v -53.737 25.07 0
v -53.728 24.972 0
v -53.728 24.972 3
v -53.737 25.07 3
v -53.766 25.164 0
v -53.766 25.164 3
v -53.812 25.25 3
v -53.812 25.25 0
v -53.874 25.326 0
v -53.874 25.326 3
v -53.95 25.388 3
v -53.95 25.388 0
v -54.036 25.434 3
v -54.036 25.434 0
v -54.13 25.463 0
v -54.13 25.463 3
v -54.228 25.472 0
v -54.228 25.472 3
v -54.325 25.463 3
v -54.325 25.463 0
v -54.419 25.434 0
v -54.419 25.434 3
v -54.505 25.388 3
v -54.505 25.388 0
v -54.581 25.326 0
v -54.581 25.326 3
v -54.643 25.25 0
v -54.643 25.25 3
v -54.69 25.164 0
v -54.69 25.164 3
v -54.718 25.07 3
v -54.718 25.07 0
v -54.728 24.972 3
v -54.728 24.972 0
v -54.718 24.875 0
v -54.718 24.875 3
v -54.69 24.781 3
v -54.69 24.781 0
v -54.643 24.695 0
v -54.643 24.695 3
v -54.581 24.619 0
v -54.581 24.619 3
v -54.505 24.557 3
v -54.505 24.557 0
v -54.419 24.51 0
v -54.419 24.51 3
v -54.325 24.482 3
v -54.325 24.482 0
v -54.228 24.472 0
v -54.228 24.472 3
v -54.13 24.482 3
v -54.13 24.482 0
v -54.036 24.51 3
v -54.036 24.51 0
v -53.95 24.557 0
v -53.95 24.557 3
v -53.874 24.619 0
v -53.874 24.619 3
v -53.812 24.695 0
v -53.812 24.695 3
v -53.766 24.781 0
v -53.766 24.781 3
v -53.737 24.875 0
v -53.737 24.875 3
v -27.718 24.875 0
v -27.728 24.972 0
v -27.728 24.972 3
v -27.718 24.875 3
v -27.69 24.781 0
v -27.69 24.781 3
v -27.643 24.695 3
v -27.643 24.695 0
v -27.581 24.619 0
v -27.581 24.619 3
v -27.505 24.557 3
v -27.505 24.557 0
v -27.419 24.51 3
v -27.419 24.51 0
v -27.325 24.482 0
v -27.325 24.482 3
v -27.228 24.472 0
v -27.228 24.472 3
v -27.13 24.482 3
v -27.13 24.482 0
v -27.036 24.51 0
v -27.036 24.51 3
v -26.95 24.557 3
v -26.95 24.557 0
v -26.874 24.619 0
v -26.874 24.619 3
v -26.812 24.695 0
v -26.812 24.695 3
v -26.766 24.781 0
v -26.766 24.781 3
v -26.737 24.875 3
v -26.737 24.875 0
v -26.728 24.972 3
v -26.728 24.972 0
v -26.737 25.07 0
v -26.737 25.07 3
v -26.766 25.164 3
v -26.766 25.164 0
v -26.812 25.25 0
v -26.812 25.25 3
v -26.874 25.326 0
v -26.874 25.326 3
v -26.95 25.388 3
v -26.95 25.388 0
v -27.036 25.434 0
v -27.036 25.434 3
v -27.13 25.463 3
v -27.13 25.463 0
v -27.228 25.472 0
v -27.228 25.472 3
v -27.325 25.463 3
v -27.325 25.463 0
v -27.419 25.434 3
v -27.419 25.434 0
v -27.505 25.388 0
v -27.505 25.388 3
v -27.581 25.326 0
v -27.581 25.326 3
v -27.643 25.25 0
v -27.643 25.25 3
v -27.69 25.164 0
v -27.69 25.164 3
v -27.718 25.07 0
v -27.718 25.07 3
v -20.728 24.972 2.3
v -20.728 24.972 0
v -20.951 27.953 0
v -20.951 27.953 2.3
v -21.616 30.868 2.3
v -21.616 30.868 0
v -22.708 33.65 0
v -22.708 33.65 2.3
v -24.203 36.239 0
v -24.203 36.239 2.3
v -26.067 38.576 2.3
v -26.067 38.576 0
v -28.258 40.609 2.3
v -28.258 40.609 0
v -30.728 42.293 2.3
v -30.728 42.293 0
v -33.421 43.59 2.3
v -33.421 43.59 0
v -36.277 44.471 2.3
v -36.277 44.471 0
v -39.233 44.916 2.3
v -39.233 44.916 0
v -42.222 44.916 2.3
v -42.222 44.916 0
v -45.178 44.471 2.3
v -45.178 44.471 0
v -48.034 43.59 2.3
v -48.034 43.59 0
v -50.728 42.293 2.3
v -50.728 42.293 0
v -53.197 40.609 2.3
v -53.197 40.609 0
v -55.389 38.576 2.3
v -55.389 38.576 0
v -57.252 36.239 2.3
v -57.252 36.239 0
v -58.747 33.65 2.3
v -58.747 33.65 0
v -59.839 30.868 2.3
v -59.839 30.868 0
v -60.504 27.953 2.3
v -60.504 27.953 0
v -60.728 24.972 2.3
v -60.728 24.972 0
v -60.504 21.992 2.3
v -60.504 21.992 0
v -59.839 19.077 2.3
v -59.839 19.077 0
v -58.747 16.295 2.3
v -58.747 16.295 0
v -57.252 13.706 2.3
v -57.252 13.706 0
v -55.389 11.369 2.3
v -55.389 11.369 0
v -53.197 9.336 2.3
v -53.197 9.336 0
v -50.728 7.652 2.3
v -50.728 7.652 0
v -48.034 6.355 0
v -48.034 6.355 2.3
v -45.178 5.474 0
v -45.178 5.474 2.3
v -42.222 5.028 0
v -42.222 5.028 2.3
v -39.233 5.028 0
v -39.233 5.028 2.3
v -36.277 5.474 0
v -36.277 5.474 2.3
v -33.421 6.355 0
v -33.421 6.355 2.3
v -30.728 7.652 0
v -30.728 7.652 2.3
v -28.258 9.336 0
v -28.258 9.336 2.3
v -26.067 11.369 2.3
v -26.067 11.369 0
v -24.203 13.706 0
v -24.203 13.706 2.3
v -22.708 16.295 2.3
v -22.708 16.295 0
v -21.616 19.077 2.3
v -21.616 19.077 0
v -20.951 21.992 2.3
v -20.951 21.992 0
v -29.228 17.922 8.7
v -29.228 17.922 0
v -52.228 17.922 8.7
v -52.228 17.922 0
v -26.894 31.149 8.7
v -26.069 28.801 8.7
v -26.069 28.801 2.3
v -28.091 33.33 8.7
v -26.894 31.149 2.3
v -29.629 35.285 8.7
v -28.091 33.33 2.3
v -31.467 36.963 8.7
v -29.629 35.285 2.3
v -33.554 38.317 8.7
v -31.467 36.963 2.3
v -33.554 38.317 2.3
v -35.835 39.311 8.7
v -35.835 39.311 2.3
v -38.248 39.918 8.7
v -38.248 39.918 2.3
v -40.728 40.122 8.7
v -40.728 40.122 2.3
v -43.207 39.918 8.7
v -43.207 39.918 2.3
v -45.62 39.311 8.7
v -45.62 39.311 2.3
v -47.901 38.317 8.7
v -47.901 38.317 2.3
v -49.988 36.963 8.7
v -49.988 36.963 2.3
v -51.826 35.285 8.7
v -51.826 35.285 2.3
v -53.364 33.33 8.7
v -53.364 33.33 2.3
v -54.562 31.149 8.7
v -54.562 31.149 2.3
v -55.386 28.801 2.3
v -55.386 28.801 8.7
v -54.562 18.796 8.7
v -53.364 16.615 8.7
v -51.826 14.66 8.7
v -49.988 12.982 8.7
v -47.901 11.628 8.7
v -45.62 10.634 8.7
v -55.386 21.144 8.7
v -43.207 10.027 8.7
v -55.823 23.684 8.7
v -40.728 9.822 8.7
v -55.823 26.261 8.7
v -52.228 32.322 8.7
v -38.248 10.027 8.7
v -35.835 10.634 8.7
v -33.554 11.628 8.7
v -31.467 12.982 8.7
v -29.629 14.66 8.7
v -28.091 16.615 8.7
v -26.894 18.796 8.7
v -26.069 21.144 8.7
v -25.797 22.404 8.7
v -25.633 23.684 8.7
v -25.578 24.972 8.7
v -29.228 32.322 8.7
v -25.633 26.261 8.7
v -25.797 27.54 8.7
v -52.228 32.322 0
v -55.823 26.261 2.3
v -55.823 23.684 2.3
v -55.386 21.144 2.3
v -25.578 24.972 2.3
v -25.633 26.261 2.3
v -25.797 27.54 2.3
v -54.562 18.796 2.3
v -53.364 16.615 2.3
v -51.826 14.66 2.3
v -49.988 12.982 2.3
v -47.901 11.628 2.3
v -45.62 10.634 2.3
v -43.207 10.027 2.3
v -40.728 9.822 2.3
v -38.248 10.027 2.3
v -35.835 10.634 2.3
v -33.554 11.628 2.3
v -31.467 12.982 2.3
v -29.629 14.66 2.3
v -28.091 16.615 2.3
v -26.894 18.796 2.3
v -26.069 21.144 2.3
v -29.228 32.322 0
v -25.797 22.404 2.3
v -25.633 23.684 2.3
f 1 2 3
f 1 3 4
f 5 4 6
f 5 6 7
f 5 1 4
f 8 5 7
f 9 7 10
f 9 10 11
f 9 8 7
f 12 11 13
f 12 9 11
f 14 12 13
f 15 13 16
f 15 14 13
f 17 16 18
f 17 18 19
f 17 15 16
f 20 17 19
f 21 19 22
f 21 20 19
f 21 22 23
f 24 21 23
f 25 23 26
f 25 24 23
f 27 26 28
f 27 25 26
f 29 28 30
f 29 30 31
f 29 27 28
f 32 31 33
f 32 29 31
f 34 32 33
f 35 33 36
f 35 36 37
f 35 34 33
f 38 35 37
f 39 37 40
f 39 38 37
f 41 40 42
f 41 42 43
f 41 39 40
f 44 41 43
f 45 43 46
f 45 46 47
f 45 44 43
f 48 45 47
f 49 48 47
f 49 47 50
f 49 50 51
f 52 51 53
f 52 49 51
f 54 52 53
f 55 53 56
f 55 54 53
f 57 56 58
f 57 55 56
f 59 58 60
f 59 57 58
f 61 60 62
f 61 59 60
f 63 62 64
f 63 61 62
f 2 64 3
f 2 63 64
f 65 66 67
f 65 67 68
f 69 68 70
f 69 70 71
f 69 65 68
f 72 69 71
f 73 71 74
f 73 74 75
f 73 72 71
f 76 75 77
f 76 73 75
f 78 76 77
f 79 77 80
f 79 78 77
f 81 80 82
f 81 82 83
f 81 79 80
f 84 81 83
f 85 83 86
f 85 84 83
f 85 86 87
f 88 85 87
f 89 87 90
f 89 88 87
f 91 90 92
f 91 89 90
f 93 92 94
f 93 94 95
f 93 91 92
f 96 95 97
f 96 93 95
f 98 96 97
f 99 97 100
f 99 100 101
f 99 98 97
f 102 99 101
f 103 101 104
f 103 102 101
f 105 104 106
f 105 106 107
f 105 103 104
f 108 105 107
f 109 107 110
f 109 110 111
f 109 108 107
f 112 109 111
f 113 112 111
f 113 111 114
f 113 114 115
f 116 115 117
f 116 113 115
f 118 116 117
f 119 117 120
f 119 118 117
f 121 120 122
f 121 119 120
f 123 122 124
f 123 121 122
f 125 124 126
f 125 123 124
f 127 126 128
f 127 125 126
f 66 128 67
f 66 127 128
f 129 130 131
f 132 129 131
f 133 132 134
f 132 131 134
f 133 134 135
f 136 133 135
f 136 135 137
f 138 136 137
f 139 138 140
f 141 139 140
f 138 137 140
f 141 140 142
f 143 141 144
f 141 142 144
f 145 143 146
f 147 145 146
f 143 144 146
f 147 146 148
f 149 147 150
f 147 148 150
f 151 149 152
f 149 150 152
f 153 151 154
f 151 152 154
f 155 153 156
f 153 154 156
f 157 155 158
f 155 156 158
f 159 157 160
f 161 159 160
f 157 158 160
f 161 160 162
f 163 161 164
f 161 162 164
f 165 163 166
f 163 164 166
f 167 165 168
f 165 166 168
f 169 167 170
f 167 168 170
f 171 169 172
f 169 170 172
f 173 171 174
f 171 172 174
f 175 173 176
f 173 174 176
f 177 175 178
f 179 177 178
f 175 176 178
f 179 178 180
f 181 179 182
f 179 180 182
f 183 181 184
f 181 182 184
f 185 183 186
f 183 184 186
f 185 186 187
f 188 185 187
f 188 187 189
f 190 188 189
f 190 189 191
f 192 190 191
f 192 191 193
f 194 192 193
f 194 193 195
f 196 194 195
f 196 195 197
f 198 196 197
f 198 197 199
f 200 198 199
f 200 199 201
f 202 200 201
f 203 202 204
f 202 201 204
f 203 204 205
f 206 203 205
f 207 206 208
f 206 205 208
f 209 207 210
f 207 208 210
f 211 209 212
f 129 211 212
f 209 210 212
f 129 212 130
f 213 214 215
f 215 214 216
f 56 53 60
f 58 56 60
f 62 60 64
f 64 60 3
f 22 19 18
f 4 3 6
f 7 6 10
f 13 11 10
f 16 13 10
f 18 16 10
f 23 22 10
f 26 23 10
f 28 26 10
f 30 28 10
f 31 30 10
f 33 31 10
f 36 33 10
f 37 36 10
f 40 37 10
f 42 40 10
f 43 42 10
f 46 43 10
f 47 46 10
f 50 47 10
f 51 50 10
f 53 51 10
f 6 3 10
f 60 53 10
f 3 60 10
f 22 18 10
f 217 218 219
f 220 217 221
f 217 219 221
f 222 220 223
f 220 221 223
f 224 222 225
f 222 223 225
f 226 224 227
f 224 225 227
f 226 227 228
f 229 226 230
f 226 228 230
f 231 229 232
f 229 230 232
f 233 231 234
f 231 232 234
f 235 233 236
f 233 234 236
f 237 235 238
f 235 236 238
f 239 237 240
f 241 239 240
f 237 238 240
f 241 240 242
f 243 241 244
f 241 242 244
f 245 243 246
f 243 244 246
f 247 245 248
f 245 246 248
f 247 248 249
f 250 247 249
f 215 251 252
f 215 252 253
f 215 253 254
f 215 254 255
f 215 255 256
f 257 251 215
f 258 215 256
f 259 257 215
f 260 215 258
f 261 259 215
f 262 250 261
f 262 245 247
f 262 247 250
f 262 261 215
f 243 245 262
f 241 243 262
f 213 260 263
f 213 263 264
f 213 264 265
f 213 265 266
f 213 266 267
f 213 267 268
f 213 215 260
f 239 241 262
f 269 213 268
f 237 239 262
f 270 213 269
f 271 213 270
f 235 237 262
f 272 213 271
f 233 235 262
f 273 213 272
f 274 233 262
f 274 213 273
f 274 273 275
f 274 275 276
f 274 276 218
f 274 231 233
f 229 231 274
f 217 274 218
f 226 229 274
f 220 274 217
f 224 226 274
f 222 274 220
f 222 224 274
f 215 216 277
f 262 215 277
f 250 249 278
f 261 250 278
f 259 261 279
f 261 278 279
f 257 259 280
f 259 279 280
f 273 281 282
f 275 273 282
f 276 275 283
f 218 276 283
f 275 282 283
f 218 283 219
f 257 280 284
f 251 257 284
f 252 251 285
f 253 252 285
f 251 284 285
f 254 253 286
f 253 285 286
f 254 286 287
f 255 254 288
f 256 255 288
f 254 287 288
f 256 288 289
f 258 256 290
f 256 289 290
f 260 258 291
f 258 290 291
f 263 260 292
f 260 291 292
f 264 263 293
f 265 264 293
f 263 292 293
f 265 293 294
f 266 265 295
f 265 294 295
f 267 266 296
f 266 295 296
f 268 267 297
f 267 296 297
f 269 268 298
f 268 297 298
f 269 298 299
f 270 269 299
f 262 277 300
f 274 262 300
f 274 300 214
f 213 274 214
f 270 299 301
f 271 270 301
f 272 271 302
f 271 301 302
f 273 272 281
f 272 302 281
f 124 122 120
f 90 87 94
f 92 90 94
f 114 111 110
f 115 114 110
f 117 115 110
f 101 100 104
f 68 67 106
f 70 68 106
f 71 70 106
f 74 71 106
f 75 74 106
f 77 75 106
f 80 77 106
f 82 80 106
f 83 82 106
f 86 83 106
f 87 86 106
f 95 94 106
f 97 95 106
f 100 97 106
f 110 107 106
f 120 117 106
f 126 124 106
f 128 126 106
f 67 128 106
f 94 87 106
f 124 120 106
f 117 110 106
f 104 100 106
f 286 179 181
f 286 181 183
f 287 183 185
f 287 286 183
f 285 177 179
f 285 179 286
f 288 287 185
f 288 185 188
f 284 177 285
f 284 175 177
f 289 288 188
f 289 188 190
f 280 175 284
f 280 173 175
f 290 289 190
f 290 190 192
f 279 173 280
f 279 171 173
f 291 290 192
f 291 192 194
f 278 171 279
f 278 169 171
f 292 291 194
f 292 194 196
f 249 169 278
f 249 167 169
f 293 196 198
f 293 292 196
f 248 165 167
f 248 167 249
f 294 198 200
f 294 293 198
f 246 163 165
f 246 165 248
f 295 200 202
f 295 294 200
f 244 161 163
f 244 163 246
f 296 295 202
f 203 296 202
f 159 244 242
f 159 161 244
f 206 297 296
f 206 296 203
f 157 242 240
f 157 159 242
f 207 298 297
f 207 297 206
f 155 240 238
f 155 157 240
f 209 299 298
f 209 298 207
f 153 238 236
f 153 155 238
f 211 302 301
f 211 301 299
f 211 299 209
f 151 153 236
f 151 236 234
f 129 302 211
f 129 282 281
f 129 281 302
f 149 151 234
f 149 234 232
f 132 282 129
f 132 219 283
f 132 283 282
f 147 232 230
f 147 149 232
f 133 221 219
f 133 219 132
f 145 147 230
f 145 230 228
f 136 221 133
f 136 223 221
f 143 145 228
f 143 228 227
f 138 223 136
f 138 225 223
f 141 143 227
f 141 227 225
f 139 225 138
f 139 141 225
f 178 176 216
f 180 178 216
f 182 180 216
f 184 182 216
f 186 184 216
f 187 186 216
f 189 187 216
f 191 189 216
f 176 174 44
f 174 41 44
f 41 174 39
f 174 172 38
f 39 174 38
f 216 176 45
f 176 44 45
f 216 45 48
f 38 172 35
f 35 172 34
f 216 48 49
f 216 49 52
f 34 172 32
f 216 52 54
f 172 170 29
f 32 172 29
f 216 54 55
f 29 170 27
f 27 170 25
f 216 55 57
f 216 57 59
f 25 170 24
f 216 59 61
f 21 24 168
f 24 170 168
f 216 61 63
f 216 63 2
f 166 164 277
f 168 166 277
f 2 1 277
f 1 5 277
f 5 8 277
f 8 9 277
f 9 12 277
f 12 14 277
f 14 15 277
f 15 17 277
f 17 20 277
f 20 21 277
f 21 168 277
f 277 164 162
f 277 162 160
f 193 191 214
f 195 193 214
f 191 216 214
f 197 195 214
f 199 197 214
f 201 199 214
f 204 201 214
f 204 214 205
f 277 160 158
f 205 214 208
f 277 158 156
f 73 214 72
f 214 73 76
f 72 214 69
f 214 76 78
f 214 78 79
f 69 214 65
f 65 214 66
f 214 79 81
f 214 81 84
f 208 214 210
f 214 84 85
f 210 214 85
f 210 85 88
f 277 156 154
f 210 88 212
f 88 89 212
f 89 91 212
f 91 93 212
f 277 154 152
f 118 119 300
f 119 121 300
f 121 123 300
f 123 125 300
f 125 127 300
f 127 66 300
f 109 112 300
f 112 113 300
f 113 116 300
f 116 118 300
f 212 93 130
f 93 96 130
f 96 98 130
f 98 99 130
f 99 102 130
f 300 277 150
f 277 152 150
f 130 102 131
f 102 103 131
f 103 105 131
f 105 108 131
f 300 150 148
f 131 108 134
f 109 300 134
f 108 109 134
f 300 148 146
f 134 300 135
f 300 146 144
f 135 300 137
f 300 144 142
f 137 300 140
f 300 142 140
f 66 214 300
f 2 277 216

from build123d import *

# Parameters (mm, degrees)
F0_R     = 0.5
F1_DEPTH = 8.7
F0_R_2   = 20
F2_DEPTH = 2.3
F3_DEPTH = 3


with BuildPart() as f1:
    # F0 (on Top) → F1 (new body)
    with BuildSketch(Plane.XY):
        with BuildLine():
            Line((-52.2276436281, 24.9724070162), (-52.2276436281, 28.9724070162))
            Line((-52.2276436281, 28.9724070162), (-54.2276436281, 28.9724070162))
            ThreePointArc((-54.2276436281, 28.9724070162), (-54.8130678601, 28.9293349241), (-55.3858843689, 28.8010462505))
            ThreePointArc((-55.3858843689, 28.8010462505), (-55.8776436281, 24.9724070162), (-55.3858843689, 21.1437677818))
            ThreePointArc((-55.3858843689, 21.1437677818), (-54.8130678601, 21.0154791082), (-54.2276436281, 20.9724070162))
            Line((-54.2276436281, 20.9724070162), (-52.2276436281, 20.9724070162))
            Line((-52.2276436281, 20.9724070162), (-52.2276436281, 24.9724070162))
        make_face()
        with Locations((-54.2276436281, 24.9724070162)):
            Circle(F0_R, mode=Mode.SUBTRACT)
        with Locations((-54.2276436281, 24.9724070162)):
            Circle(F0_R)
        with BuildLine():
            Line((-27.2276436281, 28.9724070162), (-29.2276436281, 28.9724070162))
            Line((-29.2276436281, 28.9724070162), (-29.2276436281, 24.9724070162))
            Line((-29.2276436281, 24.9724070162), (-29.2276436281, 20.9724070162))
            Line((-29.2276436281, 20.9724070162), (-27.2276436281, 20.9724070162))
            ThreePointArc((-27.2276436281, 20.9724070162), (-26.6422193961, 21.0154791082), (-26.0694028874, 21.1437677818))
            ThreePointArc((-26.0694028874, 21.1437677818), (-25.7010863507, 23.0423613201), (-25.5776436281, 24.9724070162))
            ThreePointArc((-25.5776436281, 24.9724070162), (-25.7010863507, 26.9024527122), (-26.0694028874, 28.8010462505))
            ThreePointArc((-26.0694028874, 28.8010462505), (-26.6422193961, 28.9293349241), (-27.2276436281, 28.9724070162))
        make_face()
        with BuildLine():
            ThreePointArc((-26.7276436281, 24.9724070162), (-27.2276436281, 24.4724070162), (-27.7276436281, 24.9724070162))
            ThreePointArc((-27.7276436281, 24.9724070162), (-27.2276436281, 25.4724070162), (-26.7276436281, 24.9724070162))
        make_face(mode=Mode.SUBTRACT)
        with BuildLine():
            ThreePointArc((-26.7276436281, 24.9724070162), (-27.2276436281, 25.4724070162), (-27.7276436281, 24.9724070162))
            ThreePointArc((-27.7276436281, 24.9724070162), (-27.2276436281, 24.4724070162), (-26.7276436281, 24.9724070162))
        make_face()
        with BuildLine():
            Line((-52.2276436281, 17.9224070162), (-52.2276436281, 20.9724070162))
            Line((-52.2276436281, 20.9724070162), (-54.2276436281, 20.9724070162))
            ThreePointArc((-54.2276436281, 20.9724070162), (-54.8130678601, 21.0154791082), (-55.3858843689, 21.1437677818))
            ThreePointArc((-55.3858843689, 21.1437677818), (-40.7276436281, 9.8224070162), (-26.0694028874, 21.1437677818))
            ThreePointArc((-26.0694028874, 21.1437677818), (-26.6422193961, 21.0154791082), (-27.2276436281, 20.9724070162))
            Line((-27.2276436281, 20.9724070162), (-29.2276436281, 20.9724070162))
            Line((-29.2276436281, 20.9724070162), (-29.2276436281, 17.9224070162))
            Line((-29.2276436281, 17.9224070162), (-52.2276436281, 17.9224070162))
        make_face()
        with BuildLine():
            Line((-52.2276436281, 28.9724070162), (-52.2276436281, 32.3224070162))
            Line((-52.2276436281, 32.3224070162), (-29.2276436281, 32.3224070162))
            Line((-29.2276436281, 32.3224070162), (-29.2276436281, 28.9724070162))
            Line((-29.2276436281, 28.9724070162), (-27.2276436281, 28.9724070162))
            ThreePointArc((-27.2276436281, 28.9724070162), (-26.6422193961, 28.9293349241), (-26.0694028874, 28.8010462505))
            ThreePointArc((-26.0694028874, 28.8010462505), (-40.7276436281, 40.1224070162), (-55.3858843689, 28.8010462505))
            ThreePointArc((-55.3858843689, 28.8010462505), (-54.8130678601, 28.9293349241), (-54.2276436281, 28.9724070162))
            Line((-54.2276436281, 28.9724070162), (-52.2276436281, 28.9724070162))
        make_face()
    extrude(amount=F1_DEPTH)

    # F0 (on Top) → F2 (join)
    with BuildSketch(Plane.XY):
        with Locations((-40.7276436281, 24.9724070162)):
            Circle(F0_R_2)
        with BuildLine():
            ThreePointArc((-55.3858843689, 21.1437677818), (-58.2276436281, 24.9724070162), (-55.3858843689, 28.8010462505))
            ThreePointArc((-55.3858843689, 28.8010462505), (-40.7276436281, 40.1224070162), (-26.0694028874, 28.8010462505))
            ThreePointArc((-26.0694028874, 28.8010462505), (-23.2276436281, 24.9724070162), (-26.0694028874, 21.1437677818))
            ThreePointArc((-26.0694028874, 21.1437677818), (-40.7276436281, 9.8224070162), (-55.3858843689, 21.1437677818))
        make_face(mode=Mode.SUBTRACT)
        with BuildLine():
            ThreePointArc((-55.3858843689, 21.1437677818), (-55.8776436281, 24.9724070162), (-55.3858843689, 28.8010462505))
            ThreePointArc((-55.3858843689, 28.8010462505), (-58.2276436281, 24.9724070162), (-55.3858843689, 21.1437677818))
        make_face()
        with BuildLine():
            ThreePointArc((-26.0694028874, 21.1437677818), (-23.2276436281, 24.9724070162), (-26.0694028874, 28.8010462505))
            ThreePointArc((-26.0694028874, 28.8010462505), (-25.7010863507, 26.9024527122), (-25.5776436281, 24.9724070162))
            ThreePointArc((-25.5776436281, 24.9724070162), (-25.7010863507, 23.0423613201), (-26.0694028874, 21.1437677818))
        make_face()
    extrude(amount=F2_DEPTH)

    # F0 (on Top) → F3 (cut)
    with BuildSketch(Plane.XY):
        with Locations((-54.2276436281, 24.9724070162)):
            Circle(F0_R)
        with BuildLine():
            ThreePointArc((-26.7276436281, 24.9724070162), (-27.2276436281, 25.4724070162), (-27.7276436281, 24.9724070162))
            ThreePointArc((-27.7276436281, 24.9724070162), (-27.2276436281, 24.4724070162), (-26.7276436281, 24.9724070162))
        make_face()
    extrude(amount=F3_DEPTH, mode=Mode.SUBTRACT)


solid = f1.part
